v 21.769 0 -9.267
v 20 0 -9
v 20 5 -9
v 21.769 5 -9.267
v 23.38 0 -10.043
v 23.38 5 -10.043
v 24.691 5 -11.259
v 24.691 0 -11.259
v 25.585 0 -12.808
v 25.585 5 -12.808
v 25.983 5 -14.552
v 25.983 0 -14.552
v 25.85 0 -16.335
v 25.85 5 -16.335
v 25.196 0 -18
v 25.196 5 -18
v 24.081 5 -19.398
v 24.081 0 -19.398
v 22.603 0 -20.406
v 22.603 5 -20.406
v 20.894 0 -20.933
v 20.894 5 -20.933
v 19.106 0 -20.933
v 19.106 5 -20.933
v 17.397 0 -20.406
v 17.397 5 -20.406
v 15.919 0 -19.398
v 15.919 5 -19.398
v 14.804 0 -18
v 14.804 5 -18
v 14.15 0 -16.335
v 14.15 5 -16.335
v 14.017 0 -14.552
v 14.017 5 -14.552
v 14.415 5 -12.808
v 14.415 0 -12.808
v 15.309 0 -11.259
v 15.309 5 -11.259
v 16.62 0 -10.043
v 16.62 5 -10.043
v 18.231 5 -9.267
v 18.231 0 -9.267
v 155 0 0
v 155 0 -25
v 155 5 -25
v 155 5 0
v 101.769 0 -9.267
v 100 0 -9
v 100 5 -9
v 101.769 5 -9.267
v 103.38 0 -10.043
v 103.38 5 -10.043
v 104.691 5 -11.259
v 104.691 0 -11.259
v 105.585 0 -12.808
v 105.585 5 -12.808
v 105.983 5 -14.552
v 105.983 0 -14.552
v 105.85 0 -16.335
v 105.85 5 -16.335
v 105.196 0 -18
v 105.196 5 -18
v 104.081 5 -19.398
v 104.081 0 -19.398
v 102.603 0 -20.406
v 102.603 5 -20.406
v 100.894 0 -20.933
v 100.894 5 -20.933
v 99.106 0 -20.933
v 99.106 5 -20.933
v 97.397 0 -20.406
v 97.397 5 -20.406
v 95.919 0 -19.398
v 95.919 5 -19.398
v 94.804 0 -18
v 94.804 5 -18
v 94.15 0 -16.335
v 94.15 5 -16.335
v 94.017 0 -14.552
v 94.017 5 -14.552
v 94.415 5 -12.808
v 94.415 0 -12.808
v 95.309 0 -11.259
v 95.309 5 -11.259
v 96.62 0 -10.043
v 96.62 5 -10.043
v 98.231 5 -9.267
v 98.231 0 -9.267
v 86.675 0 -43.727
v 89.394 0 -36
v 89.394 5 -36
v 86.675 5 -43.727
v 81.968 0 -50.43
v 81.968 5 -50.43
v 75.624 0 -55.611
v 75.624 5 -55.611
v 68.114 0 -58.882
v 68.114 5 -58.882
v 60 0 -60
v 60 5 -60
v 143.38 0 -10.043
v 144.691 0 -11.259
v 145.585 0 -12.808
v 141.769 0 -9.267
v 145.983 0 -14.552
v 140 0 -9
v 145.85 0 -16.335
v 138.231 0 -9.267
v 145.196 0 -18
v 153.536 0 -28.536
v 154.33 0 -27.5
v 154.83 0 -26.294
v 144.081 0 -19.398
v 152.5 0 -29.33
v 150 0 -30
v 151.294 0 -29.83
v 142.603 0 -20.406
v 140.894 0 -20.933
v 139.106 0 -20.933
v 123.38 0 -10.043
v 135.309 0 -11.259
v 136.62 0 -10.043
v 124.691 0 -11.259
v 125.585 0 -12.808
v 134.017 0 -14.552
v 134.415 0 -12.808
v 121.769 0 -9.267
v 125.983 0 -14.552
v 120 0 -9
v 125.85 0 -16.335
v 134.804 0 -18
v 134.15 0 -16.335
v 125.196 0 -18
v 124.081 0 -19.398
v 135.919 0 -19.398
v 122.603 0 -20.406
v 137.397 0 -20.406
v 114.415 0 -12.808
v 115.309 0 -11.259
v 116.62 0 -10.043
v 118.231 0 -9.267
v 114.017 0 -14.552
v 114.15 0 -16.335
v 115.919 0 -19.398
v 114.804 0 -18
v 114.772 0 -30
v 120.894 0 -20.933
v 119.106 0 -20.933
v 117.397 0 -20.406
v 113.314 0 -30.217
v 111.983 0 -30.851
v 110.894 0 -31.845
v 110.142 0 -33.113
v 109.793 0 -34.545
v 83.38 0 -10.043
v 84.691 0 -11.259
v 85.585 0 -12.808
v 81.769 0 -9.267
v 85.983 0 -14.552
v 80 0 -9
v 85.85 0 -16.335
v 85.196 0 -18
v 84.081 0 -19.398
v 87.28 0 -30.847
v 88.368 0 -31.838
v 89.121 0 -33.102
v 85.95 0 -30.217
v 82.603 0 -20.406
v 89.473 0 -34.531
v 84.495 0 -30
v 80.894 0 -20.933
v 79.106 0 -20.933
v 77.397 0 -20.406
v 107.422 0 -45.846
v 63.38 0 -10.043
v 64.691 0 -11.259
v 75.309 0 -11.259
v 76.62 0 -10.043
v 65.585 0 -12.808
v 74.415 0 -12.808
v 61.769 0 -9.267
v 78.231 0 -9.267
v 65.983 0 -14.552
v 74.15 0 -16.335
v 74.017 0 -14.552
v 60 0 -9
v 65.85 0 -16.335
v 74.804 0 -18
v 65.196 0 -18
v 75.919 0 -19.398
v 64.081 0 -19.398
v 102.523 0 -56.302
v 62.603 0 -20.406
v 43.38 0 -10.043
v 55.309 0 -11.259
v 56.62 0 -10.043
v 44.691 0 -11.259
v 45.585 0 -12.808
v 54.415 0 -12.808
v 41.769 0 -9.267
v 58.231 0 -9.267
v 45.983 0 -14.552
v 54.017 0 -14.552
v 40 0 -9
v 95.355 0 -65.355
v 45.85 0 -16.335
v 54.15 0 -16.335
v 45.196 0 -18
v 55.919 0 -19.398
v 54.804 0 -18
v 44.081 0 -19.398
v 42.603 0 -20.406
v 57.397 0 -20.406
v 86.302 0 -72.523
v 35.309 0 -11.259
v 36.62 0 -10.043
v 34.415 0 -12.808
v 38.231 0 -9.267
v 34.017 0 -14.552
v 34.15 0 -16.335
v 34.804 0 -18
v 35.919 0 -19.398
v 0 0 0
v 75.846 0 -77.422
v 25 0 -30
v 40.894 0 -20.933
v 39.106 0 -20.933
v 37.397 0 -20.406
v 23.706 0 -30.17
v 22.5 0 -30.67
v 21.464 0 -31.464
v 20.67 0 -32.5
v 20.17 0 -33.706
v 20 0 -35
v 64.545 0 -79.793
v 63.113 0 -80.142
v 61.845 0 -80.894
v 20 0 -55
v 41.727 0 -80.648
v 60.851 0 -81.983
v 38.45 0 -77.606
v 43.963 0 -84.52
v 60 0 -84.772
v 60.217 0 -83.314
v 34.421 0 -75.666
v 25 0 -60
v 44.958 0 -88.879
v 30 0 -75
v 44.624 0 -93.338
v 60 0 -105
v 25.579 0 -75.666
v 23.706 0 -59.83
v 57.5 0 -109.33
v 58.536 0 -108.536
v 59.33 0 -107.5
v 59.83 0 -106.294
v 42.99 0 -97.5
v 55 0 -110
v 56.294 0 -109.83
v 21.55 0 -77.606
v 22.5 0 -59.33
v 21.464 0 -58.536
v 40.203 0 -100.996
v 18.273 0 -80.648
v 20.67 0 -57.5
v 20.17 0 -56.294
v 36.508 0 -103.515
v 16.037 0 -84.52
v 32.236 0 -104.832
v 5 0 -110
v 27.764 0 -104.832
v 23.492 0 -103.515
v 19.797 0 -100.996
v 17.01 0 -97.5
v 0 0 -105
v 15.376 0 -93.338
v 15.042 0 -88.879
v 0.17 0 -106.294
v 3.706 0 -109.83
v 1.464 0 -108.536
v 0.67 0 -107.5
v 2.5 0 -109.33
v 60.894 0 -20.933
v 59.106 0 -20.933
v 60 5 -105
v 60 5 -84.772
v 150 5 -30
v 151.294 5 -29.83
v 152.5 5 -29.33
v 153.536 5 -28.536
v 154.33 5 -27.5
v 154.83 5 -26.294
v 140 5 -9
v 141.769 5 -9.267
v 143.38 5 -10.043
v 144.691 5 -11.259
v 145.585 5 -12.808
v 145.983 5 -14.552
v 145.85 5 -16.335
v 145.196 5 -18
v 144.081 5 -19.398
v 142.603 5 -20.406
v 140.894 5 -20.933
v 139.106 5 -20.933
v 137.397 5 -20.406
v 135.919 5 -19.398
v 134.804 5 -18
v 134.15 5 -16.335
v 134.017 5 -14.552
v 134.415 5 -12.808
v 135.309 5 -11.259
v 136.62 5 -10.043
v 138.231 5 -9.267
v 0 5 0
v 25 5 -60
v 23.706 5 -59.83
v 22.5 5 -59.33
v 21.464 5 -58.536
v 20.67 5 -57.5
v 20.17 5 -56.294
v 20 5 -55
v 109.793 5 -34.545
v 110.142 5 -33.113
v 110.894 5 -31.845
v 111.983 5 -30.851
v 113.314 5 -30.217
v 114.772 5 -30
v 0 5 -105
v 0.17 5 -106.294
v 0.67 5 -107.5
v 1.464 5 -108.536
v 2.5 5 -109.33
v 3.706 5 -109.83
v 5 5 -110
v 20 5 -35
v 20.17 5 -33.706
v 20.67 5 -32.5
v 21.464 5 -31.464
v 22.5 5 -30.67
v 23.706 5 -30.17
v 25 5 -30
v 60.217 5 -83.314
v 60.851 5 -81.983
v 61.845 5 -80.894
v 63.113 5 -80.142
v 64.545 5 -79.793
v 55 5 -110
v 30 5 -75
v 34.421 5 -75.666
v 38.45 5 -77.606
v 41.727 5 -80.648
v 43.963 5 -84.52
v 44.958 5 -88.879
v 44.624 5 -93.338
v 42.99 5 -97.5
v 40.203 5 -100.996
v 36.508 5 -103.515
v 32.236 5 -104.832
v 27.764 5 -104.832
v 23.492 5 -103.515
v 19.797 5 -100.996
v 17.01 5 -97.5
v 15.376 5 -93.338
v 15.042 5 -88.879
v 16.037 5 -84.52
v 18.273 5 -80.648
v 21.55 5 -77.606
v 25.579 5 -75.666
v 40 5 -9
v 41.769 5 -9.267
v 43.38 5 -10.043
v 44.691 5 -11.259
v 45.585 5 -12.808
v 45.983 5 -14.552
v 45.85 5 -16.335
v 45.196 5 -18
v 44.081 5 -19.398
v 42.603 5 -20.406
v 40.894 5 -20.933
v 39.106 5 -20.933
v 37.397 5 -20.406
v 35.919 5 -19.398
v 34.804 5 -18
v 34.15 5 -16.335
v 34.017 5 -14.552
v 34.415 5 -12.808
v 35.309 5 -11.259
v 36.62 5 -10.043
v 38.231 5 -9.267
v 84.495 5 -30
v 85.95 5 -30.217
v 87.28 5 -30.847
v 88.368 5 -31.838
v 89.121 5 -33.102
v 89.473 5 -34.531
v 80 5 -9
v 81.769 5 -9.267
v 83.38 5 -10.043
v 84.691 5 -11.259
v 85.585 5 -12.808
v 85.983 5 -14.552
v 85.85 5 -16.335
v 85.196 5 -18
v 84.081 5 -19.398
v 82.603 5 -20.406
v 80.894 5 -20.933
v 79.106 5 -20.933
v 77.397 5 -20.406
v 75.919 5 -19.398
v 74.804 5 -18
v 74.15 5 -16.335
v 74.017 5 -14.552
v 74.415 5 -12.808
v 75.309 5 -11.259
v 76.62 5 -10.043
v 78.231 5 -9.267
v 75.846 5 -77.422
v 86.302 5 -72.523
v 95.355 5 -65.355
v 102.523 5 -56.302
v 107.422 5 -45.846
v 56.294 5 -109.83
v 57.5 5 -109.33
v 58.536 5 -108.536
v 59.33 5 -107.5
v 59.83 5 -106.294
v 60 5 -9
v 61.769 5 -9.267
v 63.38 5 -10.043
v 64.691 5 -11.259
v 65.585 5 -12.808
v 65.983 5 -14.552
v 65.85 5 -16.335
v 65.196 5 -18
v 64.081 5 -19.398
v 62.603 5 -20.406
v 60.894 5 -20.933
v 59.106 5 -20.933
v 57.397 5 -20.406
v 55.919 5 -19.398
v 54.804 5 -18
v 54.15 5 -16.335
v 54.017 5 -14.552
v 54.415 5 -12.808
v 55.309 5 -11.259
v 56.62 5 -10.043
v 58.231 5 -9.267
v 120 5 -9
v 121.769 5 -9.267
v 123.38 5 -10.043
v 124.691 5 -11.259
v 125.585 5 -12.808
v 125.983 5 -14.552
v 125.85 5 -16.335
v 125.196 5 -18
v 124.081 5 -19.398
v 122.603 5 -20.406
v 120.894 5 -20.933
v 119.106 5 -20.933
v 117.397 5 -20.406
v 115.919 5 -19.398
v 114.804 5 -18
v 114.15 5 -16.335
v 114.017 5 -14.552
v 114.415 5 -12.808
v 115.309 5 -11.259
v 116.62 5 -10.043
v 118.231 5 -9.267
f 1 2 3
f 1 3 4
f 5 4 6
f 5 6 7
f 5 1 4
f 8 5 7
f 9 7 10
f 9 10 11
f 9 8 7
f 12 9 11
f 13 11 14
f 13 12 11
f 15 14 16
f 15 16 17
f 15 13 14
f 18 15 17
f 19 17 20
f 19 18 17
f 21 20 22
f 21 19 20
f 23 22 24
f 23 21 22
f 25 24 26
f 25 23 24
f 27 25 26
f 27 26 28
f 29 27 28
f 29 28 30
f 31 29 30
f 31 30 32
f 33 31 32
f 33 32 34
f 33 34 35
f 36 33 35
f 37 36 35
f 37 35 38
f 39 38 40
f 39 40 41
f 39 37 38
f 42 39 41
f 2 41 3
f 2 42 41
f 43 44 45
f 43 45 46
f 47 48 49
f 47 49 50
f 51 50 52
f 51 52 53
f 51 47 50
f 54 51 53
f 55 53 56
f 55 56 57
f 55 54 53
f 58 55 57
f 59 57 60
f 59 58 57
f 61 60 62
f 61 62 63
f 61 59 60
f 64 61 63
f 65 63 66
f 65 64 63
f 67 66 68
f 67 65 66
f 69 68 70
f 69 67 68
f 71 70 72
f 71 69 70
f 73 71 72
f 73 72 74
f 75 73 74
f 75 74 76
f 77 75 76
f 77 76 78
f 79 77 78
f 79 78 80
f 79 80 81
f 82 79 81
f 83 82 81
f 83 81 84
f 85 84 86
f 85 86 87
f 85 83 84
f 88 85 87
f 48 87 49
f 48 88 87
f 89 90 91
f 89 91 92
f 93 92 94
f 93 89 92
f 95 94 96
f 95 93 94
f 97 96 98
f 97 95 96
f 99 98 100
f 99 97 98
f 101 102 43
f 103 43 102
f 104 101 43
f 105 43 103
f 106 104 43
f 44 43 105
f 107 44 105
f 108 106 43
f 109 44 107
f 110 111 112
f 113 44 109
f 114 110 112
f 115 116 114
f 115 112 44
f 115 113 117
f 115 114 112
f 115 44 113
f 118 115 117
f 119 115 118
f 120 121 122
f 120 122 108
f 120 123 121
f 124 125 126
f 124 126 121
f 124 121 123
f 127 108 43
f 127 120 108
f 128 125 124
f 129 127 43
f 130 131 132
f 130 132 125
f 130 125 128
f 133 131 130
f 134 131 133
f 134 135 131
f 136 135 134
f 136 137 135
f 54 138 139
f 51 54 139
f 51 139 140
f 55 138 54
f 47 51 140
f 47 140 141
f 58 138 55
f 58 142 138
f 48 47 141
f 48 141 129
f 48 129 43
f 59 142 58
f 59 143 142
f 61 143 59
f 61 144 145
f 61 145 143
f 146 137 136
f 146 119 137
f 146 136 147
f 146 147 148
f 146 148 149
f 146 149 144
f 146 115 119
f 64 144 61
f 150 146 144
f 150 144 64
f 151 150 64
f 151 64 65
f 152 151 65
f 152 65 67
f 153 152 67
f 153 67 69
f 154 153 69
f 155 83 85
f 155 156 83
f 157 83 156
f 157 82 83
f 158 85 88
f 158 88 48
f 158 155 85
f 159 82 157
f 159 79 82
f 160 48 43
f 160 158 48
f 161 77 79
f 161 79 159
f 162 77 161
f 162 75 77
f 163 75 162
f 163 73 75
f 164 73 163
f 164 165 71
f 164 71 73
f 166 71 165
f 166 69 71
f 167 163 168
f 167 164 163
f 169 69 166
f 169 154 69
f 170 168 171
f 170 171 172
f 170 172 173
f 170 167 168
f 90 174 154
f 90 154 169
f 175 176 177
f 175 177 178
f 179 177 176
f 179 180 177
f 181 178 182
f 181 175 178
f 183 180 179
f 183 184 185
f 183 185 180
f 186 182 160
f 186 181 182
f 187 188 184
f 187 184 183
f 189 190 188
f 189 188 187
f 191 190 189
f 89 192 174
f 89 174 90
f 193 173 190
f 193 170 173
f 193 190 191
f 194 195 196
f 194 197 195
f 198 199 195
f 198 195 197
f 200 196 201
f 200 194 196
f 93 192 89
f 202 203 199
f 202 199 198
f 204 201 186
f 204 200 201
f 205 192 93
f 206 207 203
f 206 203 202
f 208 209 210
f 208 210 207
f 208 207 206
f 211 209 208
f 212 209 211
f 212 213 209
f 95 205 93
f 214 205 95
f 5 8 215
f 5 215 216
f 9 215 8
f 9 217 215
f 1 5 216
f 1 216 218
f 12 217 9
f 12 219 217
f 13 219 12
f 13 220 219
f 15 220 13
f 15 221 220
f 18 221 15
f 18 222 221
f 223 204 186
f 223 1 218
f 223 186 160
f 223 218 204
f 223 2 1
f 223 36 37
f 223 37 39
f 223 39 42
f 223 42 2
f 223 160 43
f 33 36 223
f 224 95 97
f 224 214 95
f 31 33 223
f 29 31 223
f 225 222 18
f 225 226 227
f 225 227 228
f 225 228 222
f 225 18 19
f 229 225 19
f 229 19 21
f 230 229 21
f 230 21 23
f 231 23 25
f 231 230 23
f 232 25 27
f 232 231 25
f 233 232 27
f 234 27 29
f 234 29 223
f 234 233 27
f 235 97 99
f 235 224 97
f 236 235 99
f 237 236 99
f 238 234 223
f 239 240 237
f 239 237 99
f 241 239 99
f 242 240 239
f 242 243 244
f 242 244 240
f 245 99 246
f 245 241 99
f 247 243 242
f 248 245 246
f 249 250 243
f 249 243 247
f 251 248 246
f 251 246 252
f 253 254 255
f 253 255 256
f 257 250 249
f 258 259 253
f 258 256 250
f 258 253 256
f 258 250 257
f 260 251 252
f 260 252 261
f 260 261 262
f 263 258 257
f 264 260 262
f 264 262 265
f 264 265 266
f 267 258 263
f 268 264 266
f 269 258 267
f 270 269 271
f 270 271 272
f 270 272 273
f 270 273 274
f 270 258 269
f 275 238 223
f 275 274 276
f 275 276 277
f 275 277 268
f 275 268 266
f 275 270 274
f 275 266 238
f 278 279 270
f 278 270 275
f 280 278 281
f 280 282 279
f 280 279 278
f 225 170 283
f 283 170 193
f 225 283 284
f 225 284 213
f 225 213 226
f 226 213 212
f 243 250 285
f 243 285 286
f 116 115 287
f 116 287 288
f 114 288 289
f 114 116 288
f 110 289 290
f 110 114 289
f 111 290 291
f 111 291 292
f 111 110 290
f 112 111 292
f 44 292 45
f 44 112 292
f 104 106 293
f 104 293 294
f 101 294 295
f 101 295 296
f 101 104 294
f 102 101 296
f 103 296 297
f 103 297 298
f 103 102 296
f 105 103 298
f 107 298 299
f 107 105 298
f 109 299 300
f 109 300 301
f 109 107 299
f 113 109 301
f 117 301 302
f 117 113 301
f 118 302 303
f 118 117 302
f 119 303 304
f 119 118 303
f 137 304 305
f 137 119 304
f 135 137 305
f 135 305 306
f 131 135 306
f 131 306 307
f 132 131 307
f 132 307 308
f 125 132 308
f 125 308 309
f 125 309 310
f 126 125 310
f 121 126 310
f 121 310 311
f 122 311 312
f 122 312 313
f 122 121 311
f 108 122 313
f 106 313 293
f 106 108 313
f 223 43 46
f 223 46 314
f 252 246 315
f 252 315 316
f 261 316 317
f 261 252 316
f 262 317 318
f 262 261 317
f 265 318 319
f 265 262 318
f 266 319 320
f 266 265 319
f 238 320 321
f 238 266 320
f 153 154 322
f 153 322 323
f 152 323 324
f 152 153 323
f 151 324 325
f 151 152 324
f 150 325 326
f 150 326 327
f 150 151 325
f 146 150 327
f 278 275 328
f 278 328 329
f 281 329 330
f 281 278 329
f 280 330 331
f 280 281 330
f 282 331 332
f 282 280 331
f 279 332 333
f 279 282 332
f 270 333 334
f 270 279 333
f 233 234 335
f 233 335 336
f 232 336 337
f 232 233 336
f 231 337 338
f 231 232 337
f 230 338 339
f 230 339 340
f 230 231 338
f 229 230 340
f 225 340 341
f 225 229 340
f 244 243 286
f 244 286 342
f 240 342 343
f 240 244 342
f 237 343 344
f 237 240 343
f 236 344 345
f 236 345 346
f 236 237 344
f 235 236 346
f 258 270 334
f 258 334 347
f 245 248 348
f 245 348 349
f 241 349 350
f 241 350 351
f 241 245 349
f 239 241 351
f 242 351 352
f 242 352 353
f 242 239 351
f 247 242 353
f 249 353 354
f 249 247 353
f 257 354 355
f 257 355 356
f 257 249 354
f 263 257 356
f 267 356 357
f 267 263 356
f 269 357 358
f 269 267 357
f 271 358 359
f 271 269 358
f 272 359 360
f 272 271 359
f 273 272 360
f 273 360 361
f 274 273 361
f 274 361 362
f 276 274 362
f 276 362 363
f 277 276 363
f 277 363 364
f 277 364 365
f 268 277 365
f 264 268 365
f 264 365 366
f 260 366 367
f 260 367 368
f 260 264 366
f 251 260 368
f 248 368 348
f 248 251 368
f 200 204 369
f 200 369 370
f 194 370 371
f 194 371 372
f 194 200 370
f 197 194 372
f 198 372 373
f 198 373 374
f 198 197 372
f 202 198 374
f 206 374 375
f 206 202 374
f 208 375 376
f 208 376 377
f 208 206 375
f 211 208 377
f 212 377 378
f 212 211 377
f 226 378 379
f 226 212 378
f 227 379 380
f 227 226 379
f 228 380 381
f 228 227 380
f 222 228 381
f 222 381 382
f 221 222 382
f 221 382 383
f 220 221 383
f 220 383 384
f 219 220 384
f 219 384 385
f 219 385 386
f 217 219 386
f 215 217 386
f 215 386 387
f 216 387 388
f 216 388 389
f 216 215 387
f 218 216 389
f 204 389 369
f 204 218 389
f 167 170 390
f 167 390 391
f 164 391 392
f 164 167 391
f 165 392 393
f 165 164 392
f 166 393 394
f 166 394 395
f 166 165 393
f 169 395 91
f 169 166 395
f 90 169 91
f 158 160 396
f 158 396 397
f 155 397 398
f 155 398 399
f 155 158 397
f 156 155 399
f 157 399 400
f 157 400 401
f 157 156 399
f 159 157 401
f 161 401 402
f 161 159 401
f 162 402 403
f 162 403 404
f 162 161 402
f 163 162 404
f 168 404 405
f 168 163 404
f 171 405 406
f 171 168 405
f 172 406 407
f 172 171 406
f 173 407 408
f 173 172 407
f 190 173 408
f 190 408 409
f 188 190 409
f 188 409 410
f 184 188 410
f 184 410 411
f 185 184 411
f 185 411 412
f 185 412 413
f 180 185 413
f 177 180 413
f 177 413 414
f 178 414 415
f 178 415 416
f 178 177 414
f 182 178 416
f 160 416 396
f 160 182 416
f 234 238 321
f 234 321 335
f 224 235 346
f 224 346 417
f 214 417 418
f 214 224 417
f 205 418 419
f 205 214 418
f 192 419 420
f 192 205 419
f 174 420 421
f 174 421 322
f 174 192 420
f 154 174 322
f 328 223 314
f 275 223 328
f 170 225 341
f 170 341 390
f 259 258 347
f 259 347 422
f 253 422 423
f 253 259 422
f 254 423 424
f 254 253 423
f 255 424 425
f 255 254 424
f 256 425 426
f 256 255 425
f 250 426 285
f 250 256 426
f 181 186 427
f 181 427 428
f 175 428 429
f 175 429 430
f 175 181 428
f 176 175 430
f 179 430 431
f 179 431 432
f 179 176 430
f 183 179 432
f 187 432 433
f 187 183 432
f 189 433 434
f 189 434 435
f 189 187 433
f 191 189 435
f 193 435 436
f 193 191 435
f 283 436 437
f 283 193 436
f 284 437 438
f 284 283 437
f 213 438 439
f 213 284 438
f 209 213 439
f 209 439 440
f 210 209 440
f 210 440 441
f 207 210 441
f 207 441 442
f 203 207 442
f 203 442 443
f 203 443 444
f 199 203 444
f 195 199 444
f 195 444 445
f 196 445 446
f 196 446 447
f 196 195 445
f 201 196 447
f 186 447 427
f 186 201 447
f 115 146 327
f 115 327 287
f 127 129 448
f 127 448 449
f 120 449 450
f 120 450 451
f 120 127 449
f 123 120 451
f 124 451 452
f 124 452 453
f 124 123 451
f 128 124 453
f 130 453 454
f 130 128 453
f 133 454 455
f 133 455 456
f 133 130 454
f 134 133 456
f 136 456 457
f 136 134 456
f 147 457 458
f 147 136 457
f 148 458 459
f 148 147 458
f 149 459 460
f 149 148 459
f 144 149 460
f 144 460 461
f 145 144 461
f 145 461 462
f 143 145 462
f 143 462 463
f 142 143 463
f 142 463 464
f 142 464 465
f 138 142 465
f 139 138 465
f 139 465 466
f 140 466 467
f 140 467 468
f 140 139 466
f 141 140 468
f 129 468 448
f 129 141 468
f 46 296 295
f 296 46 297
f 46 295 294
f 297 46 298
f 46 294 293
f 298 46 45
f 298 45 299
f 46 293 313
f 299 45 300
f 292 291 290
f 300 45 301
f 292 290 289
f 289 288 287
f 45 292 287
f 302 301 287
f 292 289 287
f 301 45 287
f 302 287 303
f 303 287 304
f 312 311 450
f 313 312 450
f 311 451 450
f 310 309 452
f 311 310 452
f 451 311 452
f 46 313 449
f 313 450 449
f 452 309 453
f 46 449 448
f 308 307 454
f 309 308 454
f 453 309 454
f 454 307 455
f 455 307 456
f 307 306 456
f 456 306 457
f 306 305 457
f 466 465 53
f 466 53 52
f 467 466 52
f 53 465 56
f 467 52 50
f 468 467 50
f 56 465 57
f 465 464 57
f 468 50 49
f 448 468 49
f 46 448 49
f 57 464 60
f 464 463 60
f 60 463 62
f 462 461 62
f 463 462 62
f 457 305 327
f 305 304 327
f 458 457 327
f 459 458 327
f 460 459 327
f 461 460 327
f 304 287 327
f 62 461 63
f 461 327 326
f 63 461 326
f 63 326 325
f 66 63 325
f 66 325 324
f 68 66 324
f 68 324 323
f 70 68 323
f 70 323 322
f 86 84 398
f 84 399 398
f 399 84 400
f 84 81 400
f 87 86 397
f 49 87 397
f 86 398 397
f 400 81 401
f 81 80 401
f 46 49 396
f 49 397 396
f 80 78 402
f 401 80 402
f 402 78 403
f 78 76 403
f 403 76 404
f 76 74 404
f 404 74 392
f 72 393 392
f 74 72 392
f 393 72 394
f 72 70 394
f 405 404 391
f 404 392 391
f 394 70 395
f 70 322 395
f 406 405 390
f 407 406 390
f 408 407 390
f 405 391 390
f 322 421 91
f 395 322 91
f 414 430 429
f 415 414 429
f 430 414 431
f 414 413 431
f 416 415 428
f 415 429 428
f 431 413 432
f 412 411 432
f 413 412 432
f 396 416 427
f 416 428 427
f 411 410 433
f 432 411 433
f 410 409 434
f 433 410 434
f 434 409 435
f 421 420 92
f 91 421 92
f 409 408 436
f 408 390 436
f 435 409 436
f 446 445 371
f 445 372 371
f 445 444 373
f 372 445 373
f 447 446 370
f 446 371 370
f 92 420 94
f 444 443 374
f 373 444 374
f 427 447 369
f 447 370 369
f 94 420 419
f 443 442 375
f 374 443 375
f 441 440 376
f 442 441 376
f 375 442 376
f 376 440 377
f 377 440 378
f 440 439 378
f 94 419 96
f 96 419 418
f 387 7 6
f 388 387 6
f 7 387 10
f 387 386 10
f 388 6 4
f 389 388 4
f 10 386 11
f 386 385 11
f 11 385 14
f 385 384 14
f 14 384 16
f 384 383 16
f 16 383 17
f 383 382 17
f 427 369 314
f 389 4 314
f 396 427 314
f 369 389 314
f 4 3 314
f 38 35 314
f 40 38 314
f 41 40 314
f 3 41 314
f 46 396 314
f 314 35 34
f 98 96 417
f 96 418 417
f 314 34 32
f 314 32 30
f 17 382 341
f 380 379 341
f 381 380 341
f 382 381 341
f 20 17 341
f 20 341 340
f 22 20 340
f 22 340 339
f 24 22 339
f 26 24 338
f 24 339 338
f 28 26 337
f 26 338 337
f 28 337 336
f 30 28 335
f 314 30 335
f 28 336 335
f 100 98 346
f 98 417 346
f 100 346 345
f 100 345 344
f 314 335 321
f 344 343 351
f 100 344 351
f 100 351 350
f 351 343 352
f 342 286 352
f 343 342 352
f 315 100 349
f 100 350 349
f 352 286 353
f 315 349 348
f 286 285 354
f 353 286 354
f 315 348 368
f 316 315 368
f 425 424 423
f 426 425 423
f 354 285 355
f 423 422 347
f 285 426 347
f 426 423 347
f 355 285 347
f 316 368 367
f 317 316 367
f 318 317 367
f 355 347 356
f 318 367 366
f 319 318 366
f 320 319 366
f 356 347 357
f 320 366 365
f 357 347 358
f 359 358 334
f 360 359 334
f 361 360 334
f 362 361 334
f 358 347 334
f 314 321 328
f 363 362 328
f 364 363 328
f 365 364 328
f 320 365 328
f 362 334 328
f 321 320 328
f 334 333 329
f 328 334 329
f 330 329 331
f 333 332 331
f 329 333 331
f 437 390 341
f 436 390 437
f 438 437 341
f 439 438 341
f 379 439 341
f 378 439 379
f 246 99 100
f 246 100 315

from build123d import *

# Parameters (mm, degrees)
SKETCH1_R           = 15
SKETCH1_R_2         = 6
BOSS_EXTRUDE1_DEPTH = 5


with BuildPart() as part:
    # Sketch1 → Boss-Extrude1 (new body)
    with BuildSketch(Plane(origin=(0, 0, 0), x_dir=(1, 0, 0), z_dir=(0, 1, 0))):
        with BuildLine():
            Line((114.772255751, 30), (150, 30))
            ThreePointArc((150, 30), (153.535533906, 28.535533906), (155, 25))
            Line((155, 25), (155, 0))
            Line((155, 0), (0, 0))
            Line((0, 0), (0, 105))
            ThreePointArc((0, 105), (1.464466094, 108.535533906), (5, 110))
            Line((5, 110), (55, 110))
            ThreePointArc((55, 110), (58.535533906, 108.535533906), (60, 105))
            Line((60, 105), (60, 84.772255751))
            ThreePointArc((60, 84.772255751), (61.307255271, 81.401256438), (64.545454545, 79.792959773))
            ThreePointArc((64.545454545, 79.792959773), (95.355339059, 65.355339059), (109.792959773, 34.545454545))
            ThreePointArc((109.792959773, 34.545454545), (111.401256438, 31.307255271), (114.772255751, 30))
        make_face()
        with Locations(Location((30, 90, 0), (0, 0, 270))):
            Circle(SKETCH1_R, mode=Mode.SUBTRACT)
        with Locations(Location((20, 15, 0), (0, 0, 270))):
            Circle(SKETCH1_R_2, mode=Mode.SUBTRACT)
        with Locations(Location((40, 15, 0), (0, 0, 270))):
            Circle(SKETCH1_R_2, mode=Mode.SUBTRACT)
        with Locations(Location((60, 15, 0), (0, 0, 270))):
            Circle(SKETCH1_R_2, mode=Mode.SUBTRACT)
        with Locations(Location((80, 15, 0), (0, 0, 270))):
            Circle(SKETCH1_R_2, mode=Mode.SUBTRACT)
        with Locations(Location((100, 15, 0), (0, 0, 270))):
            Circle(SKETCH1_R_2, mode=Mode.SUBTRACT)
        with Locations(Location((120, 15, 0), (0, 0, 270))):
            Circle(SKETCH1_R_2, mode=Mode.SUBTRACT)
        with Locations(Location((140, 15, 0), (0, 0, 270))):
            Circle(SKETCH1_R_2, mode=Mode.SUBTRACT)
        with BuildLine():
            Line((20, 55), (20, 35))
            ThreePointArc((20, 35), (21.464466094, 31.464466094), (25, 30))
            Line((25, 30), (84.494897428, 30))
            ThreePointArc((84.494897428, 30), (88.367880774, 31.83772234), (89.393876913, 36))
            ThreePointArc((89.393876913, 36), (78.973665961, 53.237900077), (60, 60))
            Line((60, 60), (25, 60))
            ThreePointArc((25, 60), (21.464466094, 58.535533906), (20, 55))
        make_face(mode=Mode.SUBTRACT)
    extrude(amount=BOSS_EXTRUDE1_DEPTH)


solid = part.part
